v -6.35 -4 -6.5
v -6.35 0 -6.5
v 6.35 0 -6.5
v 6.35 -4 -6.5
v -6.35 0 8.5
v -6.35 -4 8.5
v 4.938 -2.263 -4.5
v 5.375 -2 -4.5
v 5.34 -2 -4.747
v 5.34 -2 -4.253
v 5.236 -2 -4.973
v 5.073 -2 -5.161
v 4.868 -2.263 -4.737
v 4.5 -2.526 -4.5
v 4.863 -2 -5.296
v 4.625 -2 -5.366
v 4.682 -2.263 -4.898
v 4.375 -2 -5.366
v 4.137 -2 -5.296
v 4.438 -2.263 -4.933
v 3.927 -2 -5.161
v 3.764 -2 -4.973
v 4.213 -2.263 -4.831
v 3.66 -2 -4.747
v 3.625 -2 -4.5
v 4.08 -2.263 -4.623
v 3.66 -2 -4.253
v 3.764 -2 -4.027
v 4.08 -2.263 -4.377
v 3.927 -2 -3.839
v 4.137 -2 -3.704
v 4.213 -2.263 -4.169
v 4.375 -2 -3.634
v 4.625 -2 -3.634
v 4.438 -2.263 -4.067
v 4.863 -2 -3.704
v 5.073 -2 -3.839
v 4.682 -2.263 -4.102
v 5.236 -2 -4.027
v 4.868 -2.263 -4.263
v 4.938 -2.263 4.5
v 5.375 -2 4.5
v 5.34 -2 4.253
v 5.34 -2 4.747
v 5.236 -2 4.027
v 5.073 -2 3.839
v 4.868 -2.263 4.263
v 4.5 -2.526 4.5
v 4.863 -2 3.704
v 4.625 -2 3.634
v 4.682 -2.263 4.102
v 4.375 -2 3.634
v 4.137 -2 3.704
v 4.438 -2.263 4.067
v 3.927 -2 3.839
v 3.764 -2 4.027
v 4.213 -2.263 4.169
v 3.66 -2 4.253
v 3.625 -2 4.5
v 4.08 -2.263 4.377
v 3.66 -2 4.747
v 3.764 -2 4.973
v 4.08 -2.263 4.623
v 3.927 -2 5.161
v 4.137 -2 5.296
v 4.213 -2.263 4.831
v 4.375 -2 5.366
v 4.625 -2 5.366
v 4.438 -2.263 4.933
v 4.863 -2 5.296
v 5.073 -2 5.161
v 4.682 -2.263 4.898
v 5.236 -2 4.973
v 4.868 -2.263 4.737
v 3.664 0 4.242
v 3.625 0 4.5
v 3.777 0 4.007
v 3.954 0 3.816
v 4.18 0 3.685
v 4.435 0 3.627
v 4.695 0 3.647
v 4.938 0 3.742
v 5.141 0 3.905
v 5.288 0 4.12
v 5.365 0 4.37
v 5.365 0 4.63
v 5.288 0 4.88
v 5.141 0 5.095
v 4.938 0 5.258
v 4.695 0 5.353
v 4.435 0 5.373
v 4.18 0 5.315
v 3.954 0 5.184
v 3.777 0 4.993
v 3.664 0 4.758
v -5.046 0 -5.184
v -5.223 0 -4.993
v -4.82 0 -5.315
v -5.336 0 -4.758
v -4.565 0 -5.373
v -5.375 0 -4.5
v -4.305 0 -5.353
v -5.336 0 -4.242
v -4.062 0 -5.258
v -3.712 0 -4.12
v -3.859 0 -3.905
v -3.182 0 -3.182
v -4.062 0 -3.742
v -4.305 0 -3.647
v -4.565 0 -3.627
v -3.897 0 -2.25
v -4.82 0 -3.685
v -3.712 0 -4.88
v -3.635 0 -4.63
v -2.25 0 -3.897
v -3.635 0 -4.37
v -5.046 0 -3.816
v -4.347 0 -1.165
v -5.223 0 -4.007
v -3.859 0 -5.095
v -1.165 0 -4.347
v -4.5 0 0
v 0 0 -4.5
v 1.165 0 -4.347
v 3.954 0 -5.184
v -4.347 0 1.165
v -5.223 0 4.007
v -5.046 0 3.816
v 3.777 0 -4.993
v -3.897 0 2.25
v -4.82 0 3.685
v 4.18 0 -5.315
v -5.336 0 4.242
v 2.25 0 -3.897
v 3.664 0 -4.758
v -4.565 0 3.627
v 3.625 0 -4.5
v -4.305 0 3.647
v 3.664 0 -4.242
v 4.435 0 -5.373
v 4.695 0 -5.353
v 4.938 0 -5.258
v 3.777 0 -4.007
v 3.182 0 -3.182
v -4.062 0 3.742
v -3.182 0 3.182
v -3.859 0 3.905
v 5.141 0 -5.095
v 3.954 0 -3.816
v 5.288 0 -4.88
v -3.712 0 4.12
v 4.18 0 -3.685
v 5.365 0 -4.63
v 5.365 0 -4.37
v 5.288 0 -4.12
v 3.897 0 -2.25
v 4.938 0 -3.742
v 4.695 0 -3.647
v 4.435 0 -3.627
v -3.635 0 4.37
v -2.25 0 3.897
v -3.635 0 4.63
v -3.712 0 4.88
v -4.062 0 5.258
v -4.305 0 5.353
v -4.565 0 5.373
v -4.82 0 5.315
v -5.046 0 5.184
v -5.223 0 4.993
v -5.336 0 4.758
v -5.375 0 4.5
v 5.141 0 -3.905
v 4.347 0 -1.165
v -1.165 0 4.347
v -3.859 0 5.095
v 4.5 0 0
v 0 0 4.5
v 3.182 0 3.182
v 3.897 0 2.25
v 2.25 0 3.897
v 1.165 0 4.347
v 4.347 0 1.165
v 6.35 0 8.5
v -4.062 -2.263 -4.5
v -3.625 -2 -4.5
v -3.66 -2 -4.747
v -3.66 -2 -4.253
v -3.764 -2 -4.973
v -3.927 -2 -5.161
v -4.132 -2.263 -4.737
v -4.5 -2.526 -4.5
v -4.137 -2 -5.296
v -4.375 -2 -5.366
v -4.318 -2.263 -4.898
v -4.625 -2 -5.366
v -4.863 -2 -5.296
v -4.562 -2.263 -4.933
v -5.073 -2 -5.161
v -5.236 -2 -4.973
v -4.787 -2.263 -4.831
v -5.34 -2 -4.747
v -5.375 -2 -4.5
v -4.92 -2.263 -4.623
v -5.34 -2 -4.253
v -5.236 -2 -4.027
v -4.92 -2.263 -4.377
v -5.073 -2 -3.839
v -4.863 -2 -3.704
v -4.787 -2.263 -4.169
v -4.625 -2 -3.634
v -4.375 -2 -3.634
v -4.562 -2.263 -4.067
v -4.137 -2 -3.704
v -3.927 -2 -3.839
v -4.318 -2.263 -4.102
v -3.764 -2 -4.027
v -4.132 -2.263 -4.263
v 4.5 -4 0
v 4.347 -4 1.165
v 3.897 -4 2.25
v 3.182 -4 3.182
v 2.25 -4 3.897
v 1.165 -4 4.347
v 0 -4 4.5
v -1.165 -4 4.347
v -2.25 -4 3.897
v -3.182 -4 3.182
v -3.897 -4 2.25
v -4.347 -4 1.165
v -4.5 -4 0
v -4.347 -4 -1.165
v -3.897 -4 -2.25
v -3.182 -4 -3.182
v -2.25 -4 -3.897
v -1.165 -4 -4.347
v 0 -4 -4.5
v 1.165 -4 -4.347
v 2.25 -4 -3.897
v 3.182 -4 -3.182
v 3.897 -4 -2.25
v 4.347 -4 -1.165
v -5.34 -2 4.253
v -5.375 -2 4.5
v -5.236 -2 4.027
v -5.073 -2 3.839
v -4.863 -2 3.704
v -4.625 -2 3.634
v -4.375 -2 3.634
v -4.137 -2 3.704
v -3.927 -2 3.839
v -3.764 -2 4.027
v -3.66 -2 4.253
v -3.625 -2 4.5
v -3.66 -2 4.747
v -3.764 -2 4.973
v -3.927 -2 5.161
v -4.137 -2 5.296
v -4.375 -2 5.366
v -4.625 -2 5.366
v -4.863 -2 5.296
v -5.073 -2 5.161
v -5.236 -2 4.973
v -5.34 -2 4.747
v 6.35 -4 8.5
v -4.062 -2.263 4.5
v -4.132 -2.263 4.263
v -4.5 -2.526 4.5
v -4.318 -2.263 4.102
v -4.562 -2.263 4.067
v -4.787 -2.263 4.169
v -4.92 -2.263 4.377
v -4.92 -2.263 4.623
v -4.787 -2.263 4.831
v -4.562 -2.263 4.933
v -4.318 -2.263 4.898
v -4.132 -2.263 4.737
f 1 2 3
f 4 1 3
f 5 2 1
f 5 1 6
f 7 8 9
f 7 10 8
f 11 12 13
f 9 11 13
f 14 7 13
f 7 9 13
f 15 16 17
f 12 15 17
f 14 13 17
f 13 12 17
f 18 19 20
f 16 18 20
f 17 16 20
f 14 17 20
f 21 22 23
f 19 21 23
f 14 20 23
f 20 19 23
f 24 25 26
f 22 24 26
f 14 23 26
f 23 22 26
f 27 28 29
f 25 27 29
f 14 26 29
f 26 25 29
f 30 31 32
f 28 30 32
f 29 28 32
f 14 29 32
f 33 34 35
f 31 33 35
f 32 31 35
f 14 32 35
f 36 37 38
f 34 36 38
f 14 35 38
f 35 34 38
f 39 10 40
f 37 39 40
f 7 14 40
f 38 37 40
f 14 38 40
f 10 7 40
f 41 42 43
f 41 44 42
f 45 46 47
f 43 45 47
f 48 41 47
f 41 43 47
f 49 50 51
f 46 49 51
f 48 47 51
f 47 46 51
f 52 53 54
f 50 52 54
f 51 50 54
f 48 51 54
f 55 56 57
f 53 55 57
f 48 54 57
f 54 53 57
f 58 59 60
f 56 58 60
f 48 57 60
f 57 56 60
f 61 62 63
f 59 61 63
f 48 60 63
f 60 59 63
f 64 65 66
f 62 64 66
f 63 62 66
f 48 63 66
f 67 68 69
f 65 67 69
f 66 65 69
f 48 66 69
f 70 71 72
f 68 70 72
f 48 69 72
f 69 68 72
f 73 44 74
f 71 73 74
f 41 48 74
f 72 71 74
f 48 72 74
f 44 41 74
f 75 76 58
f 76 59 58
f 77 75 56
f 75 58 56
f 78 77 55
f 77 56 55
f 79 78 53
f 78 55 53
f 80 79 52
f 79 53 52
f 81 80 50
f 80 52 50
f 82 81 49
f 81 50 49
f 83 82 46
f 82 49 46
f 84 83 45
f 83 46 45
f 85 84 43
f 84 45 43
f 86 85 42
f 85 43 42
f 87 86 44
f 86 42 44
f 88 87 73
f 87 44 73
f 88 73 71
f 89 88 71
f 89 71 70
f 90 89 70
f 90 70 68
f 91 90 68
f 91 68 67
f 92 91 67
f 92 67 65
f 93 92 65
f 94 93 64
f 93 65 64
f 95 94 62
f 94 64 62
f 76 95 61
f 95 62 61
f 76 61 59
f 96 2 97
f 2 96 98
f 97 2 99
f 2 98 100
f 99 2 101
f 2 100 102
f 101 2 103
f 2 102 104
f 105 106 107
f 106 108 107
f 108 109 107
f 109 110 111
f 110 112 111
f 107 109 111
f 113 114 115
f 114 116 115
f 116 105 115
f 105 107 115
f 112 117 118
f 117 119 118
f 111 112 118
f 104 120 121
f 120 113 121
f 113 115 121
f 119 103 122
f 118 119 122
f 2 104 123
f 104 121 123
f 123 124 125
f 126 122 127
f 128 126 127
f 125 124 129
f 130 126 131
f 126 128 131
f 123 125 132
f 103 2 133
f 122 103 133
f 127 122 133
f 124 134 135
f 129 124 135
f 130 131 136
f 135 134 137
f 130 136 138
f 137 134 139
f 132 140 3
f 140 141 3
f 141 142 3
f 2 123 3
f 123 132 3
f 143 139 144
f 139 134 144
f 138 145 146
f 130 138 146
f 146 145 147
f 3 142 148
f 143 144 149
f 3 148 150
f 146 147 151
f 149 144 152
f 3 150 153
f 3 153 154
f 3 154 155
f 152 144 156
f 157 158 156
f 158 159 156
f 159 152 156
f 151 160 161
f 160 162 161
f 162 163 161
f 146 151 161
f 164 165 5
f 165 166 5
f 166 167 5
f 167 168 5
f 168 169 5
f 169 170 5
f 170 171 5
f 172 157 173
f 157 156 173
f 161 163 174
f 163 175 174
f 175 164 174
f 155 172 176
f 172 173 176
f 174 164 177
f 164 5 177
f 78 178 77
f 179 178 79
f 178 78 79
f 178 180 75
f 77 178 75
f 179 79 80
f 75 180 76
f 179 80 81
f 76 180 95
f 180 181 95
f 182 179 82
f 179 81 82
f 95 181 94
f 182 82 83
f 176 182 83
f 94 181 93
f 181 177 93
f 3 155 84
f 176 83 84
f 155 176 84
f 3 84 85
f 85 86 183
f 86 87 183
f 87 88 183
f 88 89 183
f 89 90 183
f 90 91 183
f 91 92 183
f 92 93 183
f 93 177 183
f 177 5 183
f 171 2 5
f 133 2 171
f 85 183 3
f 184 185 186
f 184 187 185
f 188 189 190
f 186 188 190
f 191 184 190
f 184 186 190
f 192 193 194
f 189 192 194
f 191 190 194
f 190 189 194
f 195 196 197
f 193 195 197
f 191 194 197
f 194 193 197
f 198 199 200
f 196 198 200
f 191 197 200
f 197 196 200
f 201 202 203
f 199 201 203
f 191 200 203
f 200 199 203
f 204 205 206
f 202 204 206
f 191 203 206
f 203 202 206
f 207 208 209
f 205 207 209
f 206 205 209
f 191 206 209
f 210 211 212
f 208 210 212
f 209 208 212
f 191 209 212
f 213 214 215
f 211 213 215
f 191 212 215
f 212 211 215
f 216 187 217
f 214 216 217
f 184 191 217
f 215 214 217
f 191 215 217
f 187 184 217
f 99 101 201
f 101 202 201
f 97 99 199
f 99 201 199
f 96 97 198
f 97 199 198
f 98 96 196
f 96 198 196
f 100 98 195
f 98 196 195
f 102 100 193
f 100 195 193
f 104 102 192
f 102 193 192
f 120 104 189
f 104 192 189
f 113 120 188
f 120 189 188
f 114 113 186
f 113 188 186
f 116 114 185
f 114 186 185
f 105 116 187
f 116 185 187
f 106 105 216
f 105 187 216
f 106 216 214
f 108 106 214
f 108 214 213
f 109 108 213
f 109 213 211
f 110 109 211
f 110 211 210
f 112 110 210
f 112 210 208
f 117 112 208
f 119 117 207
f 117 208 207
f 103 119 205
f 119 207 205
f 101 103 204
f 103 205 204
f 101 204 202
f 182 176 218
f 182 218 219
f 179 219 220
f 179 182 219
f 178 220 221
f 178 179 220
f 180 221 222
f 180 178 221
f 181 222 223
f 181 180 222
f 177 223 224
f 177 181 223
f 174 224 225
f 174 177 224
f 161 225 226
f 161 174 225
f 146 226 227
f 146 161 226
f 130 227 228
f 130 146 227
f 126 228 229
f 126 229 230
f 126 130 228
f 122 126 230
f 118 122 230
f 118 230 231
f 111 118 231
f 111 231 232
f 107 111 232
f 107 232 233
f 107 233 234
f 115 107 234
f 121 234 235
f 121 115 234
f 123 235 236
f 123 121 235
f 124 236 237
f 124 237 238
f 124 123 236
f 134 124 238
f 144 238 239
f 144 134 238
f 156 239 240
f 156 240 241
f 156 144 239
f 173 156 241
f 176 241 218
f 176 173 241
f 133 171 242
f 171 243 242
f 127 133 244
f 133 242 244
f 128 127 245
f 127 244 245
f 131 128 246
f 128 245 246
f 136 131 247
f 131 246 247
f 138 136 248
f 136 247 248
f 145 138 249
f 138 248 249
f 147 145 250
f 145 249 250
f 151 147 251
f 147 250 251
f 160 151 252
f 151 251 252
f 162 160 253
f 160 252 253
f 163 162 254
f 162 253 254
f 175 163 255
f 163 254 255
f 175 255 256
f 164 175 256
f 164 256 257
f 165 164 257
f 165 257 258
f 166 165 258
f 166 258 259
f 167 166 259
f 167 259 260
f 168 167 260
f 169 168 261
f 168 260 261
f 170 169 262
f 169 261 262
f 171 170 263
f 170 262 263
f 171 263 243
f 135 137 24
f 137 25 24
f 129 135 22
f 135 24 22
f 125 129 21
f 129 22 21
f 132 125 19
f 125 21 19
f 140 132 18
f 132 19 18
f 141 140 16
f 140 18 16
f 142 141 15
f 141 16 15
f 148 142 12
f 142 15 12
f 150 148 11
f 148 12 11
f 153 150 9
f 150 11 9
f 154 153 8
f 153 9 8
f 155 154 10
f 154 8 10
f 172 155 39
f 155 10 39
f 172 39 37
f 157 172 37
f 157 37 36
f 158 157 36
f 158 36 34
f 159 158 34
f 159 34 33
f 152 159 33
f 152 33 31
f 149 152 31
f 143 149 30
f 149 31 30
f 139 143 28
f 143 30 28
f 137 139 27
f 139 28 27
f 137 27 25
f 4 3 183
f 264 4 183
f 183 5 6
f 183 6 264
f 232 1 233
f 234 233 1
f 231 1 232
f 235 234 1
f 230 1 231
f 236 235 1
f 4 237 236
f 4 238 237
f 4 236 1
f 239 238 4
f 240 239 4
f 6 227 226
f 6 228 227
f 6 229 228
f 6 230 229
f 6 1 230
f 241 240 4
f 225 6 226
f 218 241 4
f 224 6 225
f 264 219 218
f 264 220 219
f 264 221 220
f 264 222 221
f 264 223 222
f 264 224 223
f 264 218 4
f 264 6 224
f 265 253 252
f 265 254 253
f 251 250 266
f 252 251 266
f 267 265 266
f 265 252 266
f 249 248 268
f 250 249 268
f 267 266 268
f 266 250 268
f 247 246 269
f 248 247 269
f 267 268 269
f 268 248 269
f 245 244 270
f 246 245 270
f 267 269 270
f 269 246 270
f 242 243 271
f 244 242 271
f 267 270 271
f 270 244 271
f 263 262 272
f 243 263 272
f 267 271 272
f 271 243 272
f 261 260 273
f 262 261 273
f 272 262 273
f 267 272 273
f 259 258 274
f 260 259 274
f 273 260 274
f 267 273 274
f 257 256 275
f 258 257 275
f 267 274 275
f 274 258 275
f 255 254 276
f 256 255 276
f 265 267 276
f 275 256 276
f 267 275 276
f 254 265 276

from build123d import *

# Parameters (mm, degrees)
F0_W     = 12.7
F0_H     = 15
F0_R     = 4.5
F1_DEPTH = 4
F2_D     = 1.75
F2_DEPTH = 2
F2_TIP   = 0.5257530416
F3_D     = 1.75
F3_DEPTH = 2
F3_TIP   = 0.5257530416


with BuildPart() as f1:
    # F0 (on Front) → F1 (new body)
    with BuildSketch(Plane.XZ):
        with Locations((0, 1)):
            Rectangle(F0_W, F0_H)
        Circle(F0_R, mode=Mode.SUBTRACT)
    extrude(amount=F1_DEPTH)

    # F2
    with Locations(Plane(origin=(0, 0, 0), x_dir=(1, 0, 0), z_dir=(0, 1, 0))):
        with Locations((-4.5, -4.5)):
            Hole(F2_D / 2, depth=F2_DEPTH)
            with Locations((0, 0, -(F2_DEPTH + F2_TIP / 2))):  # 118° drill point
                Cone(0, F2_D / 2, F2_TIP, mode=Mode.SUBTRACT)

    # F3
    with Locations(Plane(origin=(0, 0, 0), x_dir=(1, 0, 0), z_dir=(0, 1, 0))):
        with Locations((4.5, -4.5), (4.5, 4.5), (-4.5, 4.5)):
            Hole(F3_D / 2, depth=F3_DEPTH)
            with Locations((0, 0, -(F3_DEPTH + F3_TIP / 2))):  # 118° drill point
                Cone(0, F3_D / 2, F3_TIP, mode=Mode.SUBTRACT)


solid = f1.part
